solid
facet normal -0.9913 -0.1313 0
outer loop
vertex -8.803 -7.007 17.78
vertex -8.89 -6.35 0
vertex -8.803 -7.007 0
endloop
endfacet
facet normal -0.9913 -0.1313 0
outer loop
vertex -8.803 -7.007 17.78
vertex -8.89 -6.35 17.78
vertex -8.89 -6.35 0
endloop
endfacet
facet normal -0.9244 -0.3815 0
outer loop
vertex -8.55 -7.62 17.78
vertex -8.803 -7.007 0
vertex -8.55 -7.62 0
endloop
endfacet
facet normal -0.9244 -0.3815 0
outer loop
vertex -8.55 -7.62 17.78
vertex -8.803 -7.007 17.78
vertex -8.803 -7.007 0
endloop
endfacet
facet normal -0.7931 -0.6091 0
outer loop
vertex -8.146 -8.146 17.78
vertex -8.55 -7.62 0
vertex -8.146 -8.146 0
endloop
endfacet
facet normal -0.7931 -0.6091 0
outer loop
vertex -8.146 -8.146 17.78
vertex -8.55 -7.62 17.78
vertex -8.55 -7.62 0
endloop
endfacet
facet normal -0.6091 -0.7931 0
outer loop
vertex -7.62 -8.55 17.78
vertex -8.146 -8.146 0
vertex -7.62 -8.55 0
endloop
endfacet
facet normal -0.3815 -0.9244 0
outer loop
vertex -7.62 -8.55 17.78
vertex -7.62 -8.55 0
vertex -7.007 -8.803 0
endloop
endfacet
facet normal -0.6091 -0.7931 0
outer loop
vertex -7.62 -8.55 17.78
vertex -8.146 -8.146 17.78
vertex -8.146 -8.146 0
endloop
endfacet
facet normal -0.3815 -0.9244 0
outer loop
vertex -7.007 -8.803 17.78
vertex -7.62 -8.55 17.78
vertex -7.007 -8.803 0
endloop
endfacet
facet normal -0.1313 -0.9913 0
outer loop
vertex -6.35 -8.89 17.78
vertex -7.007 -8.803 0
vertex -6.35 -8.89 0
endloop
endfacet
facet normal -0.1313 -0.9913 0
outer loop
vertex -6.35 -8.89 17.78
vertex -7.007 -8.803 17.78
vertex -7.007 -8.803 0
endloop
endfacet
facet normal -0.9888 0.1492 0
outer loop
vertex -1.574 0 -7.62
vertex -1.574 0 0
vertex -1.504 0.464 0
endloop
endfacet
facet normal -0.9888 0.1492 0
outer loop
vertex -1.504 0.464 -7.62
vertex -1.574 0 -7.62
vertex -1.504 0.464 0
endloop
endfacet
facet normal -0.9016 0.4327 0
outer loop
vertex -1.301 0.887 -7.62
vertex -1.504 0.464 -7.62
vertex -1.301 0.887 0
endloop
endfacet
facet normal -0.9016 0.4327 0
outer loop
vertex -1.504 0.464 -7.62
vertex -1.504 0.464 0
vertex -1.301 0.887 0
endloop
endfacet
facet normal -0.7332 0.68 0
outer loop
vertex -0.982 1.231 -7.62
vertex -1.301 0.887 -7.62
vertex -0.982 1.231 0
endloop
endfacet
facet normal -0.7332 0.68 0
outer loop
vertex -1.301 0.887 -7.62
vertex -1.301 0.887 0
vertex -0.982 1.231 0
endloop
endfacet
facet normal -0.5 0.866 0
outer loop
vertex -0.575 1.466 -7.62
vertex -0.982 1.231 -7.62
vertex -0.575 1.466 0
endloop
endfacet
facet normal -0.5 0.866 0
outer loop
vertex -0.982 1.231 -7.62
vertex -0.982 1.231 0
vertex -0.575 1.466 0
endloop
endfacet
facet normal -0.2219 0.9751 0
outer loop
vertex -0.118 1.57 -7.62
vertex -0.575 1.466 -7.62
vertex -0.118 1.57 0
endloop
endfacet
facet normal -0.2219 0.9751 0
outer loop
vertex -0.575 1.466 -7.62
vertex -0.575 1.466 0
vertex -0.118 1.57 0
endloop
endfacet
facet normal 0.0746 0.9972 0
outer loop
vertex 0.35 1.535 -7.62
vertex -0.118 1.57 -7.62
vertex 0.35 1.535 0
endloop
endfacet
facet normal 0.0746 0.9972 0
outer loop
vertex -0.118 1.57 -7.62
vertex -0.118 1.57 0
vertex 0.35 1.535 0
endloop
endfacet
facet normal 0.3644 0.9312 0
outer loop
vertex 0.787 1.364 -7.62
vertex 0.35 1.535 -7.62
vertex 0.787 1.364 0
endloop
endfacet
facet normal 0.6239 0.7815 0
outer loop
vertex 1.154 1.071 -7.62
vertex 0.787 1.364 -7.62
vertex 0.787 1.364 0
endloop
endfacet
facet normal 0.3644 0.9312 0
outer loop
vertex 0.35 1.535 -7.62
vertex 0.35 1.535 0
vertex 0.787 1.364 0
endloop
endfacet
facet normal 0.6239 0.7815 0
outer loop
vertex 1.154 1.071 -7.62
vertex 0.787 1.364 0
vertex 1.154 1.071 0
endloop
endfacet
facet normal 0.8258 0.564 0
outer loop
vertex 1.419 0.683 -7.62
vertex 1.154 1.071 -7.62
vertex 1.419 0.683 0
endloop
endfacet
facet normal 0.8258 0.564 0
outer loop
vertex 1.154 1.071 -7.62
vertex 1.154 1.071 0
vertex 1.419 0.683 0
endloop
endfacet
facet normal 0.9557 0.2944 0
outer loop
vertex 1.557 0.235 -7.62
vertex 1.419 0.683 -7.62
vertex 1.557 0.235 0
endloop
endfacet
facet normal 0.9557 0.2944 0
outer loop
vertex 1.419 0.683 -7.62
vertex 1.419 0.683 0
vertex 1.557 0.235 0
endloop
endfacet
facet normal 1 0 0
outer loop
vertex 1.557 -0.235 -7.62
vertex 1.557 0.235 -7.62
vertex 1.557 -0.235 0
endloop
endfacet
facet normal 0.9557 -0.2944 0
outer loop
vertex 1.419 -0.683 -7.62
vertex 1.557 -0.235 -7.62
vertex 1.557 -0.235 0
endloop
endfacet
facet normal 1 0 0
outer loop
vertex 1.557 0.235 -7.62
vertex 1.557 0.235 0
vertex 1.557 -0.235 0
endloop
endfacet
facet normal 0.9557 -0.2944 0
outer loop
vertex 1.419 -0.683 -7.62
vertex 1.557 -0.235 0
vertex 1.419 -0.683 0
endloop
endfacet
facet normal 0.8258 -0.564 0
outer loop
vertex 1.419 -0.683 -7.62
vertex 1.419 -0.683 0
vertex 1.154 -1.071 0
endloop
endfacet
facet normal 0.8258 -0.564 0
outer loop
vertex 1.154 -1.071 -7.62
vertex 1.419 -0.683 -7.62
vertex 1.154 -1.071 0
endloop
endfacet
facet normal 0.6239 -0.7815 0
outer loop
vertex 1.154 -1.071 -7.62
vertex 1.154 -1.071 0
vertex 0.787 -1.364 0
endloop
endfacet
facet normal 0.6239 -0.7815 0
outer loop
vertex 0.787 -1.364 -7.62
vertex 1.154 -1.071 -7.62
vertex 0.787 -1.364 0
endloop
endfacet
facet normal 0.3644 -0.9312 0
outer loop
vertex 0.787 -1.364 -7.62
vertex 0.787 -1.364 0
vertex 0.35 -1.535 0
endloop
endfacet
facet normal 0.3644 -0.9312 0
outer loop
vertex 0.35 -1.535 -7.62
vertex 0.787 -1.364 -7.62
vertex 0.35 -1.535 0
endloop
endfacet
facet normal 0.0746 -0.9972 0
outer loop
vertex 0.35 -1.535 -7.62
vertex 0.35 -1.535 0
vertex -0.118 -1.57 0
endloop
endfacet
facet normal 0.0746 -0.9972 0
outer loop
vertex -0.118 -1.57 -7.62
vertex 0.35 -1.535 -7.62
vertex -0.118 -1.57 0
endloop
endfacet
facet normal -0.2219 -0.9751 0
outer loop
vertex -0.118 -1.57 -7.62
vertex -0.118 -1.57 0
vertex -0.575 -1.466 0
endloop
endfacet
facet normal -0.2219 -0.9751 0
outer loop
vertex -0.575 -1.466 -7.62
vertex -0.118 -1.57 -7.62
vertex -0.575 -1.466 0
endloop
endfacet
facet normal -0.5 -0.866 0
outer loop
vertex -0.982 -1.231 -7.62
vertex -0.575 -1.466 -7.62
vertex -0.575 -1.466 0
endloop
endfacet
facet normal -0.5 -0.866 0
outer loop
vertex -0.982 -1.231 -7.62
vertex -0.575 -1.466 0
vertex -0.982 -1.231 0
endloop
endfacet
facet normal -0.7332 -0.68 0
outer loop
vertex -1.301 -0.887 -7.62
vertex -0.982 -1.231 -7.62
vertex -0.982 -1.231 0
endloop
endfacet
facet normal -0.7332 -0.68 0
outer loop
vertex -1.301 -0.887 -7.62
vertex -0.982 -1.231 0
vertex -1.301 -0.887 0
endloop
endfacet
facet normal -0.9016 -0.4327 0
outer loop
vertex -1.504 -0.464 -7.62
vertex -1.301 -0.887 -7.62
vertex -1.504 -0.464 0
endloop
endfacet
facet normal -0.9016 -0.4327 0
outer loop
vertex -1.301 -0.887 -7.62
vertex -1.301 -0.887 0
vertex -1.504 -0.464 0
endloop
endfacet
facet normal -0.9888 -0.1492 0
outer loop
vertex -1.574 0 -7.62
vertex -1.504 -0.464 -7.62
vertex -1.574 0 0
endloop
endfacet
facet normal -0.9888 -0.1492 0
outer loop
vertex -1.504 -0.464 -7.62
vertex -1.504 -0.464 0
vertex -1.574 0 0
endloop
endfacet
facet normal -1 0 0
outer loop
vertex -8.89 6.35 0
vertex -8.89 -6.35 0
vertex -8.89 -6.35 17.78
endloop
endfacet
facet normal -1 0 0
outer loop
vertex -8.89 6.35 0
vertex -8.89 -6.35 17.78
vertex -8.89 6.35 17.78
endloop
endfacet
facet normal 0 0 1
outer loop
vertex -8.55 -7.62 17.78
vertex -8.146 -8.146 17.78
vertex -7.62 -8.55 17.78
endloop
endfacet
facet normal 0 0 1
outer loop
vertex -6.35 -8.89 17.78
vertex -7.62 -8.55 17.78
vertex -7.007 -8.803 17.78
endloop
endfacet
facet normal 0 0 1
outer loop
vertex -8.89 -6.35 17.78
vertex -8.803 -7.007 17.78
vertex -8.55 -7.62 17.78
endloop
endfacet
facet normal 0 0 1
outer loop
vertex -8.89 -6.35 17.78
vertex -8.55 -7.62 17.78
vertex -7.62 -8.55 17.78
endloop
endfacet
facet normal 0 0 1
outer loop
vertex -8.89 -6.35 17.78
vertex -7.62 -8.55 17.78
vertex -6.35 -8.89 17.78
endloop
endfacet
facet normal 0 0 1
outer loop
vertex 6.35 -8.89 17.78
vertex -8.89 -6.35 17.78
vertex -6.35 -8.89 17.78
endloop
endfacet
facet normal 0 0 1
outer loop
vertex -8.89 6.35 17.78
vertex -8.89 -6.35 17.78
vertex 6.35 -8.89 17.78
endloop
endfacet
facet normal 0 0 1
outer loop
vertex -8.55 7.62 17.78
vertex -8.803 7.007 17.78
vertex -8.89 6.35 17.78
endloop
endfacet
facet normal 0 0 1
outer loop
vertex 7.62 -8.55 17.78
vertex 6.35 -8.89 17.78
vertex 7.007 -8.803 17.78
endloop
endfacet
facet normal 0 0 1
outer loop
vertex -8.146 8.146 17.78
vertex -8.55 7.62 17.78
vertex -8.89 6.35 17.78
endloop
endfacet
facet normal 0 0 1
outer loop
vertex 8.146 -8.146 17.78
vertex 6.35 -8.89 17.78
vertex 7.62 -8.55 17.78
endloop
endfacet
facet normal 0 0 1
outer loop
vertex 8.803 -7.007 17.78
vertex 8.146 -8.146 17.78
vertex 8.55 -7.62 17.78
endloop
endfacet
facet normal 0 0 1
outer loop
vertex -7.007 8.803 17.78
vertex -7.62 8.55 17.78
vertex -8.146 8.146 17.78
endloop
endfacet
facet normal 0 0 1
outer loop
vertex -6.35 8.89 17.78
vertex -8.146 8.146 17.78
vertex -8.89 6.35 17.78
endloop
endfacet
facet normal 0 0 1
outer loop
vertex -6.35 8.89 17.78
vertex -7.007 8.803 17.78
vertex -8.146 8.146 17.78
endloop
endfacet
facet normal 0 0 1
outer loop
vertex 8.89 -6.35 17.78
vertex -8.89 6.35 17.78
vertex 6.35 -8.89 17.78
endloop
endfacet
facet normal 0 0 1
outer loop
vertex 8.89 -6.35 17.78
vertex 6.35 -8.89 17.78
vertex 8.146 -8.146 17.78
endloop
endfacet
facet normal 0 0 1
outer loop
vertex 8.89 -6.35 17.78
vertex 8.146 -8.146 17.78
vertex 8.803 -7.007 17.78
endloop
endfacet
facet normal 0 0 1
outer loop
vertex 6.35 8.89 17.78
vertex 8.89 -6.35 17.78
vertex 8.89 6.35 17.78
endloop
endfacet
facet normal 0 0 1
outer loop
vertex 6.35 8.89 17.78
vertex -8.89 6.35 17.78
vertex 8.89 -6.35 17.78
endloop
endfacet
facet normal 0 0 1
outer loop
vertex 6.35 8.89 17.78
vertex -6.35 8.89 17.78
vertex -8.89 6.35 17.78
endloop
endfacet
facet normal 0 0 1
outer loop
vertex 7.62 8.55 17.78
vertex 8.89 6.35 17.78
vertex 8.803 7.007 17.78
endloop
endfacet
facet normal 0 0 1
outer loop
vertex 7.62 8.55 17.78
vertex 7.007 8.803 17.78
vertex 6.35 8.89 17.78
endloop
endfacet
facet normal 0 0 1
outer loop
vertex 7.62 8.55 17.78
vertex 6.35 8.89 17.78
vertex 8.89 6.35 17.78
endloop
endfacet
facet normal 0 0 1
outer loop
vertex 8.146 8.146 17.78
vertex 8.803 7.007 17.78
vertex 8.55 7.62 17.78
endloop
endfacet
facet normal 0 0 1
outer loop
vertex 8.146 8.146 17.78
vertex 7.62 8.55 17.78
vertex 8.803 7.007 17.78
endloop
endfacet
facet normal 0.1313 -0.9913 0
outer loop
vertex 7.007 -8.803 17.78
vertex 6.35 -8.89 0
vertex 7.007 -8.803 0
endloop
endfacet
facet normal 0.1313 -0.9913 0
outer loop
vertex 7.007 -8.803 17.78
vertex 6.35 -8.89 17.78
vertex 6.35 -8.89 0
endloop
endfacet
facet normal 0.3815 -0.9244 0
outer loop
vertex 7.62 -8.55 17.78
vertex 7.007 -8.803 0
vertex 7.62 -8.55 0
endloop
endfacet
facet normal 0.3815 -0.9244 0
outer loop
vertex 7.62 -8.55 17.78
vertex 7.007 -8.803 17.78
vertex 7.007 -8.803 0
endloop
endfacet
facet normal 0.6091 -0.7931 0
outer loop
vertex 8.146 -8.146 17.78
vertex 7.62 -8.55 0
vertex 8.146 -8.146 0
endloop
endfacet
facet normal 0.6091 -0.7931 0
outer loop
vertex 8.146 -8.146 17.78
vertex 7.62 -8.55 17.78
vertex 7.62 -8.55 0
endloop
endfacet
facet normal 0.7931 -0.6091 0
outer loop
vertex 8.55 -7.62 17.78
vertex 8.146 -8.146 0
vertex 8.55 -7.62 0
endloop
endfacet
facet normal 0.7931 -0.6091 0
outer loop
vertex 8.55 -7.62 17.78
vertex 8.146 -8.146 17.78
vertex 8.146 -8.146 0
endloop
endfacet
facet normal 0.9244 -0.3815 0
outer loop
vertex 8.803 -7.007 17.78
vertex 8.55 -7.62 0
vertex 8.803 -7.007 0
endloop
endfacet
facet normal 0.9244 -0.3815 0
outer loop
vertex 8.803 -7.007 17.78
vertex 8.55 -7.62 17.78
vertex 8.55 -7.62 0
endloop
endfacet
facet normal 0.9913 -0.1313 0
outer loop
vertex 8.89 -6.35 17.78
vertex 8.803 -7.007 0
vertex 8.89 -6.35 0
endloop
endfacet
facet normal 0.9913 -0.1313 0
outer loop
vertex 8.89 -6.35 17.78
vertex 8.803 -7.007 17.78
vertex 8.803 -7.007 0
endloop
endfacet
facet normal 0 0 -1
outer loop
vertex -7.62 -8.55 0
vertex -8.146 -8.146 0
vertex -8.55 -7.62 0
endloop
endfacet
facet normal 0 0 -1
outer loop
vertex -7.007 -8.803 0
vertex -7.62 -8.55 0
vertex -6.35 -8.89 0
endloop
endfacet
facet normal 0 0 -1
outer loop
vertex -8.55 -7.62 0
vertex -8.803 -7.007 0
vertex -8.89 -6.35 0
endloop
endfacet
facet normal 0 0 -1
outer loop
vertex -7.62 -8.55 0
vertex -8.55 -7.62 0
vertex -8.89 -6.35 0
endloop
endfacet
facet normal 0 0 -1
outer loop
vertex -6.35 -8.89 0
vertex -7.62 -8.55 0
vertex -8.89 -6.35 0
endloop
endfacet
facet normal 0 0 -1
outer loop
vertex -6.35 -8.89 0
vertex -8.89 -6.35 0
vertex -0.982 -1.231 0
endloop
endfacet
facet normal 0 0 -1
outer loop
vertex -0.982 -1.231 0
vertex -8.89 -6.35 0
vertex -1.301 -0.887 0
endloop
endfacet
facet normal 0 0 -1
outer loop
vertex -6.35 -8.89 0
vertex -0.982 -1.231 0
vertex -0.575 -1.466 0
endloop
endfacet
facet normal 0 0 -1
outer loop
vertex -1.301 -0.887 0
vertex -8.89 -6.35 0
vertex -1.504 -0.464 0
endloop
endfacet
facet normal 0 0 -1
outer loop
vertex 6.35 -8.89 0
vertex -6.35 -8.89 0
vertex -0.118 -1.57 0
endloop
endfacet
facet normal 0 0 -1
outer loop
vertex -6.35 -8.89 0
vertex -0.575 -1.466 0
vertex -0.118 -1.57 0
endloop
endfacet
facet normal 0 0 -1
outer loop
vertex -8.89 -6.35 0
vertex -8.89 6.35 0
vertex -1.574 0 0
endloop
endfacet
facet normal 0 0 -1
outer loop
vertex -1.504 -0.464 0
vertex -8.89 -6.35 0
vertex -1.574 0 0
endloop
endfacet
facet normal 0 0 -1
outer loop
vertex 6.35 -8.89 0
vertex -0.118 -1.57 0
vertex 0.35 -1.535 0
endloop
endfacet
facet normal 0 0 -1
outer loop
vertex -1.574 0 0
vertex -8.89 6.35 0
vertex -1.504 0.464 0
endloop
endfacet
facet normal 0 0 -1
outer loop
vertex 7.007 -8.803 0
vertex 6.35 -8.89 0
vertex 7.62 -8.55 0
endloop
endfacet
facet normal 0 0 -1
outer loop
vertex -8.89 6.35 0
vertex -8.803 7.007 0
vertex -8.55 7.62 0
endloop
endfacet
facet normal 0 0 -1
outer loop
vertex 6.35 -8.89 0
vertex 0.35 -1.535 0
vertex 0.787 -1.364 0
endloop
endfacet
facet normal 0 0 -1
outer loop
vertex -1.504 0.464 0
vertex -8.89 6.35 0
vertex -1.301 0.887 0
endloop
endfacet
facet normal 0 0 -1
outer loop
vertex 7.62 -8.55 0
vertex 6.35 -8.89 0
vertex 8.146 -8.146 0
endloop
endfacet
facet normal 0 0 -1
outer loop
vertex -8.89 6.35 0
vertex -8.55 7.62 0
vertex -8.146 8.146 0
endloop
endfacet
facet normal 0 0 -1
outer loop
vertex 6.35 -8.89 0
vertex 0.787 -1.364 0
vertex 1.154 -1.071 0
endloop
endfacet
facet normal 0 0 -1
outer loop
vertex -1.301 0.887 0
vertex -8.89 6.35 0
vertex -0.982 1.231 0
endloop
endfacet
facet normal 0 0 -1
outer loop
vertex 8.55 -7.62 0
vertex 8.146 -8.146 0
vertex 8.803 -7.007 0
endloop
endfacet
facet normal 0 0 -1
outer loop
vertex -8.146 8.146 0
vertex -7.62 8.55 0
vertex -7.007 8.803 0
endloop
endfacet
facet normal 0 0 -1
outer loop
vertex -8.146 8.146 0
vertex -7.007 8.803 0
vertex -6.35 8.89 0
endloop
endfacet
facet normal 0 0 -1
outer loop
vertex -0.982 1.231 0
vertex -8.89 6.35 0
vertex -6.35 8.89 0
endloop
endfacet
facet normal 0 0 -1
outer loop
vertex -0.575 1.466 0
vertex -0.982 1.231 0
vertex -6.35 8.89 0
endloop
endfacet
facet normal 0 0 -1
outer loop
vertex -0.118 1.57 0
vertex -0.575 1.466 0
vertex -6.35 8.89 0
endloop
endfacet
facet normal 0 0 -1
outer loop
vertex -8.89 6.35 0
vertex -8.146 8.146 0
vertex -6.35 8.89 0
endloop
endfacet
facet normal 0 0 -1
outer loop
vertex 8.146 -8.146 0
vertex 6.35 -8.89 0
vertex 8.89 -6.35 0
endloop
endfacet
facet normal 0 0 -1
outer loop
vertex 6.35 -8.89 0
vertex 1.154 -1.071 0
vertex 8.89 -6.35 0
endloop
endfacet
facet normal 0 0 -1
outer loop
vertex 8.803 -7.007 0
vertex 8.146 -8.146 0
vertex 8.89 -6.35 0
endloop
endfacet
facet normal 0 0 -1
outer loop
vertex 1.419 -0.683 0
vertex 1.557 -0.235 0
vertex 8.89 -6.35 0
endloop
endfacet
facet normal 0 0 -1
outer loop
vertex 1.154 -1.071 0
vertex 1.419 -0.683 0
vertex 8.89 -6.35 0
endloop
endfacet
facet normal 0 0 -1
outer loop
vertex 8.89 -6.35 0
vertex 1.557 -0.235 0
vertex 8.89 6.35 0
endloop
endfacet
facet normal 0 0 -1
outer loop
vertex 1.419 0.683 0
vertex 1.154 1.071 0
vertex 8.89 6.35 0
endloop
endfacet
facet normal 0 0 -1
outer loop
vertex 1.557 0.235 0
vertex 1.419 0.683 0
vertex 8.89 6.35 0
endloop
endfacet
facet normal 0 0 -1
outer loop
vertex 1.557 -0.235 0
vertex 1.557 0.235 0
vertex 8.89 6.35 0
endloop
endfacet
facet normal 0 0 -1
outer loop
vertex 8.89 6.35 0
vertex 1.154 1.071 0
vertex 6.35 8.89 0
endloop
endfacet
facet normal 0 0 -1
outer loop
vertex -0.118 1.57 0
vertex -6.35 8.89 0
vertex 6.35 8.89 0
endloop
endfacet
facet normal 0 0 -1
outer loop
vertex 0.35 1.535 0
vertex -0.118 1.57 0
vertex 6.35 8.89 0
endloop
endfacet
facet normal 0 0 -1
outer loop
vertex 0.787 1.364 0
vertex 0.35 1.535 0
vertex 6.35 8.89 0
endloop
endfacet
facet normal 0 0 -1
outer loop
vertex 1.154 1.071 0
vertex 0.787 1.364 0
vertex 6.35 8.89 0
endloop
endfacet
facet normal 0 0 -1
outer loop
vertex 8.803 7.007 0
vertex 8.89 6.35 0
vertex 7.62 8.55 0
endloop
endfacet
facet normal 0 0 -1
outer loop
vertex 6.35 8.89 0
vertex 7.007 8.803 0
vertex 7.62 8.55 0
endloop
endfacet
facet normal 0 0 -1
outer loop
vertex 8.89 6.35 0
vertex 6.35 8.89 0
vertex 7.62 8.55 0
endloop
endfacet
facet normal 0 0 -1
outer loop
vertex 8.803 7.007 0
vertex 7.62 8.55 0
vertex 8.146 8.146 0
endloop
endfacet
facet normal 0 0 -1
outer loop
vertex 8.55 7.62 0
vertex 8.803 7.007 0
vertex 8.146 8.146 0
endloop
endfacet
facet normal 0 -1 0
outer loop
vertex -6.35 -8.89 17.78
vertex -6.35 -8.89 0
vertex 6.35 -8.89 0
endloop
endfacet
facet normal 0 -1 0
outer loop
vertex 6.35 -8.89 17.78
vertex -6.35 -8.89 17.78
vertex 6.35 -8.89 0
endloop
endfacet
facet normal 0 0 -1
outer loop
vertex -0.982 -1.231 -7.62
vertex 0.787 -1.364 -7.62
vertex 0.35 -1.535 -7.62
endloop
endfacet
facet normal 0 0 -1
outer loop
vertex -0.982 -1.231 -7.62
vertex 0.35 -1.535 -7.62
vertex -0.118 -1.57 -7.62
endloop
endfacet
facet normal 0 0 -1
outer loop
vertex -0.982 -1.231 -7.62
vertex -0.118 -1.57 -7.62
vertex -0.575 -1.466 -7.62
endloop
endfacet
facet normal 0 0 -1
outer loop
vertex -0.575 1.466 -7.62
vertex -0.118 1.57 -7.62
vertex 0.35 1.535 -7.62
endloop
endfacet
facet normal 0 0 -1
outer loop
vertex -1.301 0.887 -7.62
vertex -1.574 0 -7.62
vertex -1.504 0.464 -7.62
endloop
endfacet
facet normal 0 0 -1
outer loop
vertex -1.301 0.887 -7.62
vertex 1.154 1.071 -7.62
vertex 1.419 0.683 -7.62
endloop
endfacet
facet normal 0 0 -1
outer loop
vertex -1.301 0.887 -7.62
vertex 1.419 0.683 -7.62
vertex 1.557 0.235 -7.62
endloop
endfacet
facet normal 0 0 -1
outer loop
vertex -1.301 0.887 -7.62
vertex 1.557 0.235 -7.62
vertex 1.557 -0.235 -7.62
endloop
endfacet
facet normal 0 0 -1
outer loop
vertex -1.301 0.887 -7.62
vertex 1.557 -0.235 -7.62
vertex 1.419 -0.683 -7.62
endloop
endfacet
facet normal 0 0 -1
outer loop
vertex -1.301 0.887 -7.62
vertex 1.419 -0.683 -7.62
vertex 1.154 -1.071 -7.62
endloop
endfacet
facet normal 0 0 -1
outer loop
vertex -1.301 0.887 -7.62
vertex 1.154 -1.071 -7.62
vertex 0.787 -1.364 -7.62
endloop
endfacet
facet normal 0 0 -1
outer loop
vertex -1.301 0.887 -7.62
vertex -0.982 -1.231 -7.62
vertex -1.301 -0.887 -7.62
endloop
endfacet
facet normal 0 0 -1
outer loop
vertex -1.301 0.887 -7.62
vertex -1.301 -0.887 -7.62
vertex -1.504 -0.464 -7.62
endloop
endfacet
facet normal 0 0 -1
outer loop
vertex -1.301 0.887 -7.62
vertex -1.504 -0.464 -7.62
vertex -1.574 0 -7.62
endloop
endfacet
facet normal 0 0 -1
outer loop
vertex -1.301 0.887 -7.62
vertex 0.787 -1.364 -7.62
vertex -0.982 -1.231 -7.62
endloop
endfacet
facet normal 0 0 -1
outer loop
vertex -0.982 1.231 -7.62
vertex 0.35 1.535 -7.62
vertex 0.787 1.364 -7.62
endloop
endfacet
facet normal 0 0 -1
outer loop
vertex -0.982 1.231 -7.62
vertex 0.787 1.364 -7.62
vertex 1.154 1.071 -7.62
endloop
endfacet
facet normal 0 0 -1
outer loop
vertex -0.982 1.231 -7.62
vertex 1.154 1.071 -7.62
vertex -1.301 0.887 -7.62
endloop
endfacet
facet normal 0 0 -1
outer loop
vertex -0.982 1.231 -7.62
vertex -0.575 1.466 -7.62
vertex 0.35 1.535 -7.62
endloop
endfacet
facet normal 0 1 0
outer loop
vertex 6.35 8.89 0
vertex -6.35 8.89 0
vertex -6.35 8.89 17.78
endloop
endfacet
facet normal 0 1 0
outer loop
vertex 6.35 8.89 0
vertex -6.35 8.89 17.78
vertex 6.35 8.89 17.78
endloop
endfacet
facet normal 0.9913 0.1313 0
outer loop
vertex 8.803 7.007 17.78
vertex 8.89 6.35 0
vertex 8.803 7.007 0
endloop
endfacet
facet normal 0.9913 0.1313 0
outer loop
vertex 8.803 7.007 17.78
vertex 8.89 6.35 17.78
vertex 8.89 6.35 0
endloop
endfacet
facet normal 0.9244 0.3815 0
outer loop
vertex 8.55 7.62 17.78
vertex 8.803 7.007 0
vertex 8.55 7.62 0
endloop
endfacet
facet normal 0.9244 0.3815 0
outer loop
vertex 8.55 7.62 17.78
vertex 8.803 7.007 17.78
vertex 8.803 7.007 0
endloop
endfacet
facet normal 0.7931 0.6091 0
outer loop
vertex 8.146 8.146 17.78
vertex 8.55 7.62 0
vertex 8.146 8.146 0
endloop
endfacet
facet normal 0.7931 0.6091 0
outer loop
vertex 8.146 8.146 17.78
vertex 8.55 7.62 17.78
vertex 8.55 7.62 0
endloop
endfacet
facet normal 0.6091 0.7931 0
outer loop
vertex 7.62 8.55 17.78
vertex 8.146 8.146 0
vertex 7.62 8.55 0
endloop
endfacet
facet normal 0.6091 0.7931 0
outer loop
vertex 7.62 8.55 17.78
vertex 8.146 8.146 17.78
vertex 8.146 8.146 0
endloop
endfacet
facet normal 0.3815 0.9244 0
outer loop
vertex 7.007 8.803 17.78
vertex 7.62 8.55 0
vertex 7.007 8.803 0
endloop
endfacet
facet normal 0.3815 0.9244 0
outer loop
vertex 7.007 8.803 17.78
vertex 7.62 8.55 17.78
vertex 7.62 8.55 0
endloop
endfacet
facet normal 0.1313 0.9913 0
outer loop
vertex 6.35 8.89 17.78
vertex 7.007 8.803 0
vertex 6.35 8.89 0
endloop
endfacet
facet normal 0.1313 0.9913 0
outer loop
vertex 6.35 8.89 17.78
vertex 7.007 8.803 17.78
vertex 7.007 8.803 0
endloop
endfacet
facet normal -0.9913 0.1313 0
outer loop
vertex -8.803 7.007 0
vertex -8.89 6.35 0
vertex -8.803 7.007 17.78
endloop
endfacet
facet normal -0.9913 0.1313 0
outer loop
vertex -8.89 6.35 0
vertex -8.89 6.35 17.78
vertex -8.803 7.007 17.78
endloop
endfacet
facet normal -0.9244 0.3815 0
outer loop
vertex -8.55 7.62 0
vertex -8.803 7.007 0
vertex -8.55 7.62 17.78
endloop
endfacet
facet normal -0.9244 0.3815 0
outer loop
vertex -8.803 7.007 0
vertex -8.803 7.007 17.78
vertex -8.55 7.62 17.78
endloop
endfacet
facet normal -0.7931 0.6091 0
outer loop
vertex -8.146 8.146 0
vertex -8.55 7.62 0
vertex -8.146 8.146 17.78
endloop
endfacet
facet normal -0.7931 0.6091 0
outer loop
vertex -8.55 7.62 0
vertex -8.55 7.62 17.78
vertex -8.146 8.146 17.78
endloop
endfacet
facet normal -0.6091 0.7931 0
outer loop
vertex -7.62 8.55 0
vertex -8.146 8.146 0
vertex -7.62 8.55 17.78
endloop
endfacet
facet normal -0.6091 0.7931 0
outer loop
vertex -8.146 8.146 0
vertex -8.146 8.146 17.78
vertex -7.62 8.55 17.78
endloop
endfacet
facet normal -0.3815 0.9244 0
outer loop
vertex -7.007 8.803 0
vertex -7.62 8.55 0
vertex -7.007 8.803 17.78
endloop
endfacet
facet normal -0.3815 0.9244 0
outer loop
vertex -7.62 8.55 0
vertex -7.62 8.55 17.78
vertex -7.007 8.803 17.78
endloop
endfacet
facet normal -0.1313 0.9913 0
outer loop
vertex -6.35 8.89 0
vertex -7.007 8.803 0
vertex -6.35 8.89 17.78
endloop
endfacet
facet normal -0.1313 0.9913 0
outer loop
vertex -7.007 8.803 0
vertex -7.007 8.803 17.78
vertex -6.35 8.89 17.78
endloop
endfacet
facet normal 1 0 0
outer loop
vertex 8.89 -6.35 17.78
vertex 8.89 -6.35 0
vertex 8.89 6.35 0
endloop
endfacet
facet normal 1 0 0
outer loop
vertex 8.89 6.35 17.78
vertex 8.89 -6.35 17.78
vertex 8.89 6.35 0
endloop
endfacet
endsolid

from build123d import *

# Parameters (mm, degrees)
SKETCH1_W           = 17.78
SKETCH1_H           = 17.78
BOSS_EXTRUDE1_DEPTH = 17.78
FILLET1_R           = 2.54
SKETCH2_R           = 1.574444288
BOSS_EXTRUDE2_DEPTH = 7.62


with BuildPart() as part:
    # Sketch1 → Boss-Extrude1 (new body)
    with BuildSketch(Plane.XY):
        Rectangle(SKETCH1_W, SKETCH1_H)
    extrude(amount=BOSS_EXTRUDE1_DEPTH)

    # Fillet1
    fillet1_edges = [part.edges().sort_by_distance(p)[0] for p in [
        (8.89, -8.89, 8.89),
        (-8.89, -8.89, 8.89),
        (-8.89, 8.89, 8.89),
        (8.89, 8.89, 8.89),
    ]]
    fillet(fillet1_edges, radius=FILLET1_R)

    # Sketch2 → Boss-Extrude2 (add)
    with BuildSketch(Plane(origin=(0, 0, 0), x_dir=(-1, 0, 0), z_dir=(0, 0, -1))):
        Circle(SKETCH2_R)
    extrude(amount=BOSS_EXTRUDE2_DEPTH)


solid = part.part
